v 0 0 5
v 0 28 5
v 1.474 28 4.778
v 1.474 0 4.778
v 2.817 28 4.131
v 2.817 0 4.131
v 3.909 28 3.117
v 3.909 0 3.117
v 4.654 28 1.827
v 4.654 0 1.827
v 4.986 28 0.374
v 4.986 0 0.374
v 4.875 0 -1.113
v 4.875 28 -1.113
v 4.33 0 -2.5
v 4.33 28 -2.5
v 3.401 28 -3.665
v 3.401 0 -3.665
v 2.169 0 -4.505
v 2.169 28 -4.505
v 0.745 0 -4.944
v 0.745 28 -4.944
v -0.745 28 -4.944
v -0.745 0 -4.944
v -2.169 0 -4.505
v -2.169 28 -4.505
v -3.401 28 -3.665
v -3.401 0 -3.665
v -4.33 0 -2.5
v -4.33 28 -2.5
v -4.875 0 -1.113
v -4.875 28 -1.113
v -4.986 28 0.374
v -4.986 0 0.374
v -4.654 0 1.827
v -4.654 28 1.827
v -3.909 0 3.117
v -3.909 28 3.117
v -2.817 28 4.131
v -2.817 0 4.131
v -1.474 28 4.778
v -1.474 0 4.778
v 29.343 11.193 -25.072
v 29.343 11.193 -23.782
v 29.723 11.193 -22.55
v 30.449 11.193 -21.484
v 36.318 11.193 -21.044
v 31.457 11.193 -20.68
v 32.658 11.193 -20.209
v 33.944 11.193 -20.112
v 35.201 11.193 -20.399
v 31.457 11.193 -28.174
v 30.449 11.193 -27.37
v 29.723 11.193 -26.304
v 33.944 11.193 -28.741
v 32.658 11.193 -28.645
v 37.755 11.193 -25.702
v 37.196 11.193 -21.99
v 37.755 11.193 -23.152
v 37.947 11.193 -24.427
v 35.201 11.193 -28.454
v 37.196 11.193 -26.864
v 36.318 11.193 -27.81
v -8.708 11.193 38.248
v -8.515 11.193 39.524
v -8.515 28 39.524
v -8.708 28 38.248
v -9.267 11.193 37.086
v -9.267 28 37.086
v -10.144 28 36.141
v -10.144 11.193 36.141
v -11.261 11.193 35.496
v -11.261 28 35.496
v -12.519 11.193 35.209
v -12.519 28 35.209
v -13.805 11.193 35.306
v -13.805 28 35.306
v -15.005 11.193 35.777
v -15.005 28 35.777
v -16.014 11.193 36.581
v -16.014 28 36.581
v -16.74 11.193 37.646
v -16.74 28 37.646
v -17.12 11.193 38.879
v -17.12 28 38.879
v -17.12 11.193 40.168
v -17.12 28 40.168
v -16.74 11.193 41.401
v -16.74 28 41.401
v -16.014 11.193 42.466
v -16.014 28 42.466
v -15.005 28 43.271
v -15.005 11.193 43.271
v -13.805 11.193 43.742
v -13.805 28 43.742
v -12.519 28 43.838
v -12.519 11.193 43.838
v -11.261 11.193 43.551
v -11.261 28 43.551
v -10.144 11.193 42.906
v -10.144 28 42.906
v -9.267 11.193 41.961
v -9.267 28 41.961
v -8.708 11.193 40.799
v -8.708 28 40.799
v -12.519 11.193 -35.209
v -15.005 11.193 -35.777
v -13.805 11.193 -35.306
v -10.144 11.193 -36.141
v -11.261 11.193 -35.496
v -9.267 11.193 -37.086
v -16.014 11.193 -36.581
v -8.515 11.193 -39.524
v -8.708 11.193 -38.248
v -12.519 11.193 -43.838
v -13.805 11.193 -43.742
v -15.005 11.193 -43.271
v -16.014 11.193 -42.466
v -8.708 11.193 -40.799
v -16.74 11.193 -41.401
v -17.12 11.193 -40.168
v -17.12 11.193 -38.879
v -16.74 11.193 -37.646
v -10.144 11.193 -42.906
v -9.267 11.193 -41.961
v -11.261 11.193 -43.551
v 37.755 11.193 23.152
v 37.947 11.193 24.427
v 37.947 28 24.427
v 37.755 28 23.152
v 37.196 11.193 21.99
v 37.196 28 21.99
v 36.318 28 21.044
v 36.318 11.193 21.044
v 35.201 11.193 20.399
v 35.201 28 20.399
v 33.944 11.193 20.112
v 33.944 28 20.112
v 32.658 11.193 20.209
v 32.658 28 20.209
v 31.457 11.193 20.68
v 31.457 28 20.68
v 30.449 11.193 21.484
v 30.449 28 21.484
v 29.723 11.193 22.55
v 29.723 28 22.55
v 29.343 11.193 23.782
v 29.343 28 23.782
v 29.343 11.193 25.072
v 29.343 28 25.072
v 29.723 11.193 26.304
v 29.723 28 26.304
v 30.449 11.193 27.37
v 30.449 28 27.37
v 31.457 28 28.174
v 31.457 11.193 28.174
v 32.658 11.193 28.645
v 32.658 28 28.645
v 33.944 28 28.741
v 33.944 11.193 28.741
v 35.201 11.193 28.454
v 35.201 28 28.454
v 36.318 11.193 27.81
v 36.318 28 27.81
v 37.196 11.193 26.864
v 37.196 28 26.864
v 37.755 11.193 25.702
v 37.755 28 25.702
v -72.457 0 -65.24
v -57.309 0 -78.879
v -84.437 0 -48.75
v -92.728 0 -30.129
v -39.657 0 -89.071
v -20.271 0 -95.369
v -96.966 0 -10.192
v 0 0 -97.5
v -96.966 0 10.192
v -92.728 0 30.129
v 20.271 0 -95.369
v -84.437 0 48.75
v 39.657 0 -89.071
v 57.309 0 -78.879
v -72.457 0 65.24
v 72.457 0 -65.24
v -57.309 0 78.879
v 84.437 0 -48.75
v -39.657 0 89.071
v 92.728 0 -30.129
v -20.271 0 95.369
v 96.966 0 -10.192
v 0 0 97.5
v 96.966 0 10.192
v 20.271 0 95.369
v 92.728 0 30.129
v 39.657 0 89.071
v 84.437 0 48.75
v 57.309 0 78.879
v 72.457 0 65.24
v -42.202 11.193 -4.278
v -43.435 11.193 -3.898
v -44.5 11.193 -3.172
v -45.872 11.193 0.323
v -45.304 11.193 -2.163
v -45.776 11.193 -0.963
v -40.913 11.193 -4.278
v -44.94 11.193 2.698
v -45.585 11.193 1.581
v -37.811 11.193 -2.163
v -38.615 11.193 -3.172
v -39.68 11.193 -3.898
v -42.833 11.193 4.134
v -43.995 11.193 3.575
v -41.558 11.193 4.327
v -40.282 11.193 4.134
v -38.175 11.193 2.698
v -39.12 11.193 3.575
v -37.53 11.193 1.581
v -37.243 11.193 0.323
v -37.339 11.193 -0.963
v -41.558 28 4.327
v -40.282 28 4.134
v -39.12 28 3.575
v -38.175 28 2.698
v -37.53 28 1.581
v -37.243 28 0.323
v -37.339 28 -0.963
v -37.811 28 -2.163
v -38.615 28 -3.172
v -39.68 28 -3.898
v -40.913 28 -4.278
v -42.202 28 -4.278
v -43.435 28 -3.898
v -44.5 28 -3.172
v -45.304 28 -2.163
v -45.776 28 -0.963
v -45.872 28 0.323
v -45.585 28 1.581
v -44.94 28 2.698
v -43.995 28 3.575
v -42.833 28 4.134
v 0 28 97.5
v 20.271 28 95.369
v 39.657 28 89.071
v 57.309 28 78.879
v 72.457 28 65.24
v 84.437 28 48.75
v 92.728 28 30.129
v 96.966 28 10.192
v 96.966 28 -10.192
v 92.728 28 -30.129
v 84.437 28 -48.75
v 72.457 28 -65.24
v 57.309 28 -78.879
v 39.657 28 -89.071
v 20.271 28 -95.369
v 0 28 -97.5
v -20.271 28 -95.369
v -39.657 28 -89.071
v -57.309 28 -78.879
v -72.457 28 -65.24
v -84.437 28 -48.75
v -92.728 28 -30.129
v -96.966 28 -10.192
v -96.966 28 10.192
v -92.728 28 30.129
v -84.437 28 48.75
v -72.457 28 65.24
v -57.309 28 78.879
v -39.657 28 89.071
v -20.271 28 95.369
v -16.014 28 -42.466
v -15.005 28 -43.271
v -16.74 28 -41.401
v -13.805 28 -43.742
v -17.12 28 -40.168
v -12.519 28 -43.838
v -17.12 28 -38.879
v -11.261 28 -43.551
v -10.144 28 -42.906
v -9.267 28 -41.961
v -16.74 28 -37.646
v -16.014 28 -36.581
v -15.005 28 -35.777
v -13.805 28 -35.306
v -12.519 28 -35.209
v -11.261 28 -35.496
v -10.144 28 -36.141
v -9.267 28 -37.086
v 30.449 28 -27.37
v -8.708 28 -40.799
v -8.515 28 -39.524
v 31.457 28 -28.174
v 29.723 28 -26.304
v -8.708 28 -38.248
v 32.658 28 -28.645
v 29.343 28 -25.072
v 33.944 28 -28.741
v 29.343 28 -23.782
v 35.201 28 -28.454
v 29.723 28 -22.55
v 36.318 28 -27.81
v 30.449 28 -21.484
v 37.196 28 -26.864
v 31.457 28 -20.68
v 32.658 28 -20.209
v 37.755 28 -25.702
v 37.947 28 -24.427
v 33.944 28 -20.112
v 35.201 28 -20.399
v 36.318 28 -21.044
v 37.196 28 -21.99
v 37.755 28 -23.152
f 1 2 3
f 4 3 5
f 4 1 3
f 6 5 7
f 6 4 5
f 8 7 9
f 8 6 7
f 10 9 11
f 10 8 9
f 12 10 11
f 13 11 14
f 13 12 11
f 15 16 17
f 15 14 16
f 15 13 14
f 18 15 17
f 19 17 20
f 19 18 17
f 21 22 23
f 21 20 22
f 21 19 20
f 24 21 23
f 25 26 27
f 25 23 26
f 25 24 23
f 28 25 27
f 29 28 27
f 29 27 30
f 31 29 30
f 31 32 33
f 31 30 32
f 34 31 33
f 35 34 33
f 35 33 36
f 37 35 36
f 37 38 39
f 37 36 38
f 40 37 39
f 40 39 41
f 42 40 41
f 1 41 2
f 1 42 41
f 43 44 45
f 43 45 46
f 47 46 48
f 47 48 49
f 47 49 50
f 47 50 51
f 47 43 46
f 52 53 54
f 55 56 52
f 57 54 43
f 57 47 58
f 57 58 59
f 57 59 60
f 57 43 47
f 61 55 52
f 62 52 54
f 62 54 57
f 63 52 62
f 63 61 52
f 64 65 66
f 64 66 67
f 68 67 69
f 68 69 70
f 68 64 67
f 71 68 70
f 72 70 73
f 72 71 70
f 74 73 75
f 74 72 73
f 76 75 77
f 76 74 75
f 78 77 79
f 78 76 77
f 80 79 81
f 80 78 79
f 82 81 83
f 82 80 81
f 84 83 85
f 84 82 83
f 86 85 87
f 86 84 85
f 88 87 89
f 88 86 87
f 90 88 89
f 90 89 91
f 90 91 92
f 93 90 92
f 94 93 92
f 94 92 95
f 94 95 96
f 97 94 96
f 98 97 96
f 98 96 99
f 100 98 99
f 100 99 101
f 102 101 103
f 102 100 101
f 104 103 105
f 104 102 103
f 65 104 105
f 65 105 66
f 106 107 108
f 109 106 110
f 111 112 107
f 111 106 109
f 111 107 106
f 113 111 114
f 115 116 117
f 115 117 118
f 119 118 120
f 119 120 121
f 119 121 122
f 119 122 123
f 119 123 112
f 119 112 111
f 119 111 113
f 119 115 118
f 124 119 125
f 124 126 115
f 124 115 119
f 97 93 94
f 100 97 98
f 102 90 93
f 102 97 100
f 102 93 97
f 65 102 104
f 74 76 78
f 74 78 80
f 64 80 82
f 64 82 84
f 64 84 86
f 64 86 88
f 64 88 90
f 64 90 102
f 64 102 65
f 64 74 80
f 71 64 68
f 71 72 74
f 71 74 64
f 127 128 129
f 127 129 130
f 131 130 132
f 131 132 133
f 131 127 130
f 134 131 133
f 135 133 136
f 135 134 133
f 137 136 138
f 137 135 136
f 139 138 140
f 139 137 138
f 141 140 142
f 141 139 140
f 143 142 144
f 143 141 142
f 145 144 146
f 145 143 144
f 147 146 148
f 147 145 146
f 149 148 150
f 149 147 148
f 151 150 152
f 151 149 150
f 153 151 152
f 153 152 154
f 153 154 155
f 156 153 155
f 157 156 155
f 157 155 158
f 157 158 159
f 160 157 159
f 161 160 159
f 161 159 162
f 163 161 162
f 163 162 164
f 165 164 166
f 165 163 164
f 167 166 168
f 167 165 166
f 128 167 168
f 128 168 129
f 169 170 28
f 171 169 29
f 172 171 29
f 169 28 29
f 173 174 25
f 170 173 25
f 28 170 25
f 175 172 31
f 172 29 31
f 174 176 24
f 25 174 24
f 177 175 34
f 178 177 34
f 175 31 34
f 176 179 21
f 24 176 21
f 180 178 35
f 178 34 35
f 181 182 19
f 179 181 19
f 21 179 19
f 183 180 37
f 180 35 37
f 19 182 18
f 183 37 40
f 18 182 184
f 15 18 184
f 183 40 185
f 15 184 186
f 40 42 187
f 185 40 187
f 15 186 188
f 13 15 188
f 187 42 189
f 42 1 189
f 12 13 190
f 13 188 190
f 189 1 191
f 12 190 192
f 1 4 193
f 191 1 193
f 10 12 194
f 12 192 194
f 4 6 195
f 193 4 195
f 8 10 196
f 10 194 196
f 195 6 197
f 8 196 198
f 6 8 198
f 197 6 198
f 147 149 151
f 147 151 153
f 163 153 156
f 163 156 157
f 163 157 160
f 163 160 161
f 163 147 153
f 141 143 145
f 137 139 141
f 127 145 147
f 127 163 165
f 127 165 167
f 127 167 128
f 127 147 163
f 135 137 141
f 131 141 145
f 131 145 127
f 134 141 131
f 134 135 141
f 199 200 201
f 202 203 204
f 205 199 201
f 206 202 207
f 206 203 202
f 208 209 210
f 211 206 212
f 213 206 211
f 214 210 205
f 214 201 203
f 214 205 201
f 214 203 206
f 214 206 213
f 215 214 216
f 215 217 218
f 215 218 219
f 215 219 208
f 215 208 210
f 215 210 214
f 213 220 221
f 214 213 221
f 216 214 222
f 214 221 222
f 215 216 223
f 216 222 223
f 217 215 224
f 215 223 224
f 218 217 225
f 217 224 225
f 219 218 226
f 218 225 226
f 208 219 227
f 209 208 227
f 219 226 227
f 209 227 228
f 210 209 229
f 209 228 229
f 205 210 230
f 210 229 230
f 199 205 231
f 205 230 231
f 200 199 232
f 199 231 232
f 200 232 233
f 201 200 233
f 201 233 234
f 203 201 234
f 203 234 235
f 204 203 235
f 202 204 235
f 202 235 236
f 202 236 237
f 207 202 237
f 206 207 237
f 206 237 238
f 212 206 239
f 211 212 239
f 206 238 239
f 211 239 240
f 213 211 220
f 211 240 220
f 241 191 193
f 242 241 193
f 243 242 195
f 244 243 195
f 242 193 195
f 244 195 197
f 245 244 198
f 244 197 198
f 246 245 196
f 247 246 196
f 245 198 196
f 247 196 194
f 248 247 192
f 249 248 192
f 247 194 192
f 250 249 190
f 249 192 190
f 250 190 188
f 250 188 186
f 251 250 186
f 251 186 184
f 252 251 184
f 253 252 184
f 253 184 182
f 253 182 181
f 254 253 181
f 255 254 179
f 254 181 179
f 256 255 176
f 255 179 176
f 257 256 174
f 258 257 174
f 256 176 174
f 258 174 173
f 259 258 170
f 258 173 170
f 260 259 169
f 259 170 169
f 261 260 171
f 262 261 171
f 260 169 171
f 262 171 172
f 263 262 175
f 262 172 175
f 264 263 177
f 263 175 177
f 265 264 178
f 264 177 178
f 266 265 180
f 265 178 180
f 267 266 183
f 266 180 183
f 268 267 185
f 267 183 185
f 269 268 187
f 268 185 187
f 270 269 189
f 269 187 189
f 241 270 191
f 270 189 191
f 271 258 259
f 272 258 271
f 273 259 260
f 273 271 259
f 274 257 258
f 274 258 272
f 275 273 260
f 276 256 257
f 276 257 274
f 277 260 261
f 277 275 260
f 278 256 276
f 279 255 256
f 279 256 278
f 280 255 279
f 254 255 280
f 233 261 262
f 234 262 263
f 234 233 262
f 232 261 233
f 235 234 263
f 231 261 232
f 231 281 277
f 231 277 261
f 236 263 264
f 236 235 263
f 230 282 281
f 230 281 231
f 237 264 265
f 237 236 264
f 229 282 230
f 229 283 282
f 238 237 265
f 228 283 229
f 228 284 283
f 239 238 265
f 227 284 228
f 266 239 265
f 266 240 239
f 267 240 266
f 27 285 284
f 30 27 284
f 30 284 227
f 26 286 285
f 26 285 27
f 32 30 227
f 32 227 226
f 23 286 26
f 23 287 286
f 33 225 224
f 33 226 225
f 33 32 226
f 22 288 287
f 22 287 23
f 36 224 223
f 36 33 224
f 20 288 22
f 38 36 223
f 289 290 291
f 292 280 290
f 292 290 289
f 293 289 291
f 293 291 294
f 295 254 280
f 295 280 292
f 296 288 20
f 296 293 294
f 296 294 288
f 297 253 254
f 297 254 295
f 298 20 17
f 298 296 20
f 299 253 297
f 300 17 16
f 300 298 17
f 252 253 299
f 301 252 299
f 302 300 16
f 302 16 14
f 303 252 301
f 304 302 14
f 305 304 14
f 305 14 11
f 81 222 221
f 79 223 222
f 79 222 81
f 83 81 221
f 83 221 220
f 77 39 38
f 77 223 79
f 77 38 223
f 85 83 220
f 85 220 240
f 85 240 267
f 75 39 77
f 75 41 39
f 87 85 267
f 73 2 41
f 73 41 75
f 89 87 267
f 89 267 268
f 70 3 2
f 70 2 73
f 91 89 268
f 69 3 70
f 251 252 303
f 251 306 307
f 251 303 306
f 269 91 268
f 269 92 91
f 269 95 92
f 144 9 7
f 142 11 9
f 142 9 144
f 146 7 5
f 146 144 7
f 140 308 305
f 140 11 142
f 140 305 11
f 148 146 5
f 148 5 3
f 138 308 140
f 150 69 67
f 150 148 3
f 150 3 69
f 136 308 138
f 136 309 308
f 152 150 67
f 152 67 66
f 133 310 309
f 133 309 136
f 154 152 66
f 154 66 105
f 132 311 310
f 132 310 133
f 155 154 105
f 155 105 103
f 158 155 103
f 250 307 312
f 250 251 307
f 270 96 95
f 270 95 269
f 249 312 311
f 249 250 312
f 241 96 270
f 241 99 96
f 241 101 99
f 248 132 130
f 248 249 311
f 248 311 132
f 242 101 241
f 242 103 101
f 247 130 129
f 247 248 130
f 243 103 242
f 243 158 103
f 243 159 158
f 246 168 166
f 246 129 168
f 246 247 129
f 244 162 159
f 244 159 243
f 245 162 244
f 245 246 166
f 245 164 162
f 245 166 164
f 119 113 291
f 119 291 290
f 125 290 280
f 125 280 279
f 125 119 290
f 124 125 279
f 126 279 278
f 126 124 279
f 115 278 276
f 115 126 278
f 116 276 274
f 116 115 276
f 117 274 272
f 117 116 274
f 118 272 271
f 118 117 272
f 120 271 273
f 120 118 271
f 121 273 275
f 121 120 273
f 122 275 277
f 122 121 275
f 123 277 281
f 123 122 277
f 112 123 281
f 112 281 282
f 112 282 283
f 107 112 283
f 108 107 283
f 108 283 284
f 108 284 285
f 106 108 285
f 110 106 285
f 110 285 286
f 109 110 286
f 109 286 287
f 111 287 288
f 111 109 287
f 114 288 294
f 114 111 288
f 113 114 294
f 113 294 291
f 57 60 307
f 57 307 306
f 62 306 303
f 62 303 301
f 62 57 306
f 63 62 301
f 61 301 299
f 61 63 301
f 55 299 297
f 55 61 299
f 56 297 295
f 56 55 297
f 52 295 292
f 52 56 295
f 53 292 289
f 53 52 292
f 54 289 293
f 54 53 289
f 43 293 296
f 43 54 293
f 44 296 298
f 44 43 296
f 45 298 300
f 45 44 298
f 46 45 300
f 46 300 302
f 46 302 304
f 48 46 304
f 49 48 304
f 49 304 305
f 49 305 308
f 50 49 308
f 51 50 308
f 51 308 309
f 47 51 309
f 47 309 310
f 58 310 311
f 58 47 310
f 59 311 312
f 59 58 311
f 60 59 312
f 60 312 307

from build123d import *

# Parameters (mm, degrees)
SKETCH1_R           = 97.5
BOSS_EXTRUDE1_DEPTH = 28
SKETCH2_R           = 5
CUT_EXTRUDE1_DEPTH  = 141.700035537
SKETCH3_R           = 4.326572982
CUT_EXTRUDE2_DEPTH  = 16.807422219
CIRPATTERN1_COUNT   = 5


with BuildPart() as part:
    # Sketch1 → Boss-Extrude1 (new body)
    with BuildSketch(Plane(origin=(0, 0, 0), x_dir=(1, 0, 0), z_dir=(0, 1, 0))):
        Circle(SKETCH1_R)
    extrude(amount=BOSS_EXTRUDE1_DEPTH)

    # Sketch2 → Cut-Extrude1 (cut, through all)
    with BuildSketch(Plane(origin=(0, 0, 0), x_dir=(1, 0, 0), z_dir=(0, 1, 0))):
        Circle(SKETCH2_R)
    extrude(amount=CUT_EXTRUDE1_DEPTH, mode=Mode.SUBTRACT)

    # Sketch3 → Cut-Extrude2 (cut)
    with BuildSketch(Plane(origin=(0, 28, 0), x_dir=(1, 0, 0), z_dir=(0, 1, 0))):
        with Locations((-41.55757465, 0)):
            Circle(SKETCH3_R)
    cut_extrude2 = extrude(amount=-CUT_EXTRUDE2_DEPTH, mode=Mode.SUBTRACT)

    # CirPattern1: Cut-Extrude2 ×5 about axis
    cirpattern1_axis = Axis((0, 0, 0), (0, 1, 0))
    for i in range(1, CIRPATTERN1_COUNT):
        add(cut_extrude2.rotate(cirpattern1_axis, i * 360 / CIRPATTERN1_COUNT), mode=Mode.SUBTRACT)


solid = part.part
